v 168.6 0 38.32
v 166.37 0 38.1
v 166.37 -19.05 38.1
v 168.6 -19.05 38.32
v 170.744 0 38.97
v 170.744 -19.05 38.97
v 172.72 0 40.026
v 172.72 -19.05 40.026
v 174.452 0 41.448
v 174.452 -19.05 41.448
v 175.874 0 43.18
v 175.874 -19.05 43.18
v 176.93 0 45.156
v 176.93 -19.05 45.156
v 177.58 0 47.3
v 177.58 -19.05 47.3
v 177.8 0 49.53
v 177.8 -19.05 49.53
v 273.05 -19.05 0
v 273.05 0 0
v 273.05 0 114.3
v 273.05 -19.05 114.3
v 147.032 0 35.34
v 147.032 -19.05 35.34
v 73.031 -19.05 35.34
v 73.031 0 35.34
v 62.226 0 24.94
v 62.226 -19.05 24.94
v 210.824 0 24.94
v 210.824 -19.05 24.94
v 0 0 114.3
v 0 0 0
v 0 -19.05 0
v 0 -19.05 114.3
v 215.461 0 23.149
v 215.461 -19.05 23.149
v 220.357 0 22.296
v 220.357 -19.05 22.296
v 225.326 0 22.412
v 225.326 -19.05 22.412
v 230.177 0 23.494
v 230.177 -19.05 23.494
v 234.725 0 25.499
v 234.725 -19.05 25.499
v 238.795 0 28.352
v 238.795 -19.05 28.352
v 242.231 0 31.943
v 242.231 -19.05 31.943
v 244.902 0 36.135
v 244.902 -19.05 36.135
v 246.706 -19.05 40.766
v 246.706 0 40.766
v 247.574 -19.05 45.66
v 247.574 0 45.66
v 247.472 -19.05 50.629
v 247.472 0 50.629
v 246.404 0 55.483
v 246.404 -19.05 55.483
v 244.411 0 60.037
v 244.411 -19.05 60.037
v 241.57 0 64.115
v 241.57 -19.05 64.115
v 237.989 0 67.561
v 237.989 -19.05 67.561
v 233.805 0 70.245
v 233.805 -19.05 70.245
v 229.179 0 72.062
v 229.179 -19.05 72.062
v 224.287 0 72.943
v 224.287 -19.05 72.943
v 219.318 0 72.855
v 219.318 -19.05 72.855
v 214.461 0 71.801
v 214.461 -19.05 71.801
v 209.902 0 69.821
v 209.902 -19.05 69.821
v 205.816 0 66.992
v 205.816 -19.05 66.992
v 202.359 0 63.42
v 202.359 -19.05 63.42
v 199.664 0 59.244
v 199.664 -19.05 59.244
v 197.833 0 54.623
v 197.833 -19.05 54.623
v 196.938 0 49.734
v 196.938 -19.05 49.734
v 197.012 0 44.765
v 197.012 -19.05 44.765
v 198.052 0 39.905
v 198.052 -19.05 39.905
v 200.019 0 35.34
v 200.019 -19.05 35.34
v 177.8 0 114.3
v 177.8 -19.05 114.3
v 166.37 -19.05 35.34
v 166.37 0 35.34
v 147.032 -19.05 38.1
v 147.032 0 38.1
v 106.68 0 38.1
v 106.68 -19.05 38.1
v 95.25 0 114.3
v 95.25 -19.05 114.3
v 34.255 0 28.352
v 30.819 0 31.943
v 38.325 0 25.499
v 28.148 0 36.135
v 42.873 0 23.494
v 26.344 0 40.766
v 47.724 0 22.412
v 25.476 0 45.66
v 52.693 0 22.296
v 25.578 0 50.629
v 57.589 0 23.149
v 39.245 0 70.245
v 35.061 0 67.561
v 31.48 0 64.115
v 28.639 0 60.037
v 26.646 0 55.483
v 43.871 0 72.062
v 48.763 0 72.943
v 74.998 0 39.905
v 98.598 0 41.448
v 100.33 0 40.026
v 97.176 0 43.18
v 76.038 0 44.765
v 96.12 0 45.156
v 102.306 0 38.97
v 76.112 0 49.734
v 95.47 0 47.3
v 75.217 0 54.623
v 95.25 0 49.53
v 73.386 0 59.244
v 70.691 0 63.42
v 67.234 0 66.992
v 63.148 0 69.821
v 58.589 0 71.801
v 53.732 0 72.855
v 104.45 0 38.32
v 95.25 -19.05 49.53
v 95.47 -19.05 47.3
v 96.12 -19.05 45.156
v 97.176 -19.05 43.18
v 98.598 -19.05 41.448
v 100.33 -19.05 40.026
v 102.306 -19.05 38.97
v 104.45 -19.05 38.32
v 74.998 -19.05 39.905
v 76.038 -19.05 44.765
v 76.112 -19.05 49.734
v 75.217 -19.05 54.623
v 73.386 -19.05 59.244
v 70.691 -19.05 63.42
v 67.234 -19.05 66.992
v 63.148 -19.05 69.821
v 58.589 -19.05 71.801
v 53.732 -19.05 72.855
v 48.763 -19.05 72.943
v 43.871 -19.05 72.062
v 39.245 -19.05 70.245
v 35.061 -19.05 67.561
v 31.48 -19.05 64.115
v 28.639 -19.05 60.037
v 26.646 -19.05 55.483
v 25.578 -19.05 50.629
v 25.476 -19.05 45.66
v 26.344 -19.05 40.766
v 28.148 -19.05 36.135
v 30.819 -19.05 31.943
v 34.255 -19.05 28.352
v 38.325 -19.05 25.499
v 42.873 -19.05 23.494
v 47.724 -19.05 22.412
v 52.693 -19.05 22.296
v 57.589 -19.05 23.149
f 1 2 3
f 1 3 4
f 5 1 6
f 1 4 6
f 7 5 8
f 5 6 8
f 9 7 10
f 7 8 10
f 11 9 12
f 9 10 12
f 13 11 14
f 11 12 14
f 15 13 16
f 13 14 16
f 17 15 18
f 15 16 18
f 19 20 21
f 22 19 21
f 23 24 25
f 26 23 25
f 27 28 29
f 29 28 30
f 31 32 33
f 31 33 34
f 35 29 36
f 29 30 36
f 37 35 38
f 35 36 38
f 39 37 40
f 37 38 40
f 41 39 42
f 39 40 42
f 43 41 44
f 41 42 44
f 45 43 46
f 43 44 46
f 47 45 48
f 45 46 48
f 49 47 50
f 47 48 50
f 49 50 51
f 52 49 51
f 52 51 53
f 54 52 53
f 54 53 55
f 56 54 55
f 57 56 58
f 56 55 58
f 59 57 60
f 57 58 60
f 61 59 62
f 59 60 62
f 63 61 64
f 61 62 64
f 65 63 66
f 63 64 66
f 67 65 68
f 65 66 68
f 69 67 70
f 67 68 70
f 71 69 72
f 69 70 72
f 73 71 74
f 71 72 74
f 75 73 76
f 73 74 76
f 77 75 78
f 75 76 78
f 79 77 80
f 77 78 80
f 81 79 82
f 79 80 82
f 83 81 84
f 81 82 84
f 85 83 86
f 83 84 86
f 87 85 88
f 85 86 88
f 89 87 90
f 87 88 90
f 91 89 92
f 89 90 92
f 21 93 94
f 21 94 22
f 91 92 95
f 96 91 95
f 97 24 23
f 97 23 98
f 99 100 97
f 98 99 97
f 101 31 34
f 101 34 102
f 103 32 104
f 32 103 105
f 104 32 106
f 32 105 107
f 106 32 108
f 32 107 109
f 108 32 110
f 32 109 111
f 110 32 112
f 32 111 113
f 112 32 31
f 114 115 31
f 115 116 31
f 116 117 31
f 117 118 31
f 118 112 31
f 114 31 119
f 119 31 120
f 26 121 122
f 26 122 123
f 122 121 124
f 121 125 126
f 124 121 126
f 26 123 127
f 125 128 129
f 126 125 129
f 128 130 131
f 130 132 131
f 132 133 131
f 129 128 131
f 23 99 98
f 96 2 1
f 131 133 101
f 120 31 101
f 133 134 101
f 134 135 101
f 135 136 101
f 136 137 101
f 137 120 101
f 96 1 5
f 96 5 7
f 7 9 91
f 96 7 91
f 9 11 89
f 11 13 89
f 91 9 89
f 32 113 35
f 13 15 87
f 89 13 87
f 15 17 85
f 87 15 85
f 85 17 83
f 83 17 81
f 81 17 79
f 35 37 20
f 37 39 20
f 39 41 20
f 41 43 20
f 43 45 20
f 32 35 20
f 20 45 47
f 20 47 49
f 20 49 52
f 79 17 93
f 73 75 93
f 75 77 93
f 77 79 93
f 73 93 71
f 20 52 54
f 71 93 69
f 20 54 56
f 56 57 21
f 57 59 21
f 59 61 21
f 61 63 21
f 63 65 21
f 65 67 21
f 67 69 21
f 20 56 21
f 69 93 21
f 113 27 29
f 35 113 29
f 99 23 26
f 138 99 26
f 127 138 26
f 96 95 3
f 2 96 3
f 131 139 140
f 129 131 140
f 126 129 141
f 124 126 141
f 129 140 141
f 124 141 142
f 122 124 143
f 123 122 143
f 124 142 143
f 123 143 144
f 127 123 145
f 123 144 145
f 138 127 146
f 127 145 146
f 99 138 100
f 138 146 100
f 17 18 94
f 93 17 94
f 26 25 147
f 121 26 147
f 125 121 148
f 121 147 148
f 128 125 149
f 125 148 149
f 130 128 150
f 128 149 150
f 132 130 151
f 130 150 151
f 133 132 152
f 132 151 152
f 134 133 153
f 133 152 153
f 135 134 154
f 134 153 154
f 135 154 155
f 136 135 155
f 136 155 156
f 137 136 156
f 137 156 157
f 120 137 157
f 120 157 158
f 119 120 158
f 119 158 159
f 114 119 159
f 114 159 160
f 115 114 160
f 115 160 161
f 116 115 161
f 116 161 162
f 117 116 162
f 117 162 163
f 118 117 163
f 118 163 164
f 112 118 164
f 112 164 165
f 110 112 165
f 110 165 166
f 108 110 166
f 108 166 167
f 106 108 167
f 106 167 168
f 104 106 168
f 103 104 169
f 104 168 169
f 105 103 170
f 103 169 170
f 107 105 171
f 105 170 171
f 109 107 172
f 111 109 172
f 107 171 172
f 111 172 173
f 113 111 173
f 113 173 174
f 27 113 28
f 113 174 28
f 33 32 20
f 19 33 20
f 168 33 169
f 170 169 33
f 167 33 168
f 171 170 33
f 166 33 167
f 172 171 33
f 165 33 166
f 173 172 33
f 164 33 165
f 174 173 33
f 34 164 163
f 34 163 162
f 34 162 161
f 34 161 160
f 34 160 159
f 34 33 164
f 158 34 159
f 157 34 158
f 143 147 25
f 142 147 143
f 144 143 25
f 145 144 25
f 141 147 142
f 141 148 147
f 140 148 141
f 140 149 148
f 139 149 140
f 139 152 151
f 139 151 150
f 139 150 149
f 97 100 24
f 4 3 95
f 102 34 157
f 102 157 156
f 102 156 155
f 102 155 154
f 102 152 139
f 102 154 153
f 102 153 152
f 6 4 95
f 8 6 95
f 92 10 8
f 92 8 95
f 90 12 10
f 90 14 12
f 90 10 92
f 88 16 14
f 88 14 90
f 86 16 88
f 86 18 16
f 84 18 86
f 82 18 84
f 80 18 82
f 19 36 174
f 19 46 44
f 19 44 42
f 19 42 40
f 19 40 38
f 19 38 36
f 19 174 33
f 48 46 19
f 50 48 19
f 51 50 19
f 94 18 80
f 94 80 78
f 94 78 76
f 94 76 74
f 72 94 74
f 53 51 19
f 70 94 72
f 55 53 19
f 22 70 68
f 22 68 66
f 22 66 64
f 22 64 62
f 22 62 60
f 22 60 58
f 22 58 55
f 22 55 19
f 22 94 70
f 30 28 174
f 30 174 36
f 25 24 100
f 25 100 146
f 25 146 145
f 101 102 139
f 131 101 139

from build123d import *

# Parameters (mm, degrees)
F0_W     = 273.05
F0_H     = 114.3
F1_DEPTH = 19.05
F2_R     = 25.4
F3_DEPTH = 25.4
F5_DEPTH = 25.4
F7_DEPTH = 25.4
F8_W     = 19.3382904482
F8_H     = 2.7599734166
F9_DEPTH = 25.4


# Not quite as in the source:
# - a feature names something its author has since deleted; it is built from what else it names


with BuildPart() as f1:
    # F0 (on Front) → F1 (new body)
    with BuildSketch(Plane.XZ):
        with Locations((136.525, 57.15)):
            Rectangle(F0_W, F0_H)
    extrude(amount=F1_DEPTH)

    # F2 (on face) → F3 (cut)
    with BuildSketch(Plane.XZ.offset(19.05)):
        with Locations((50.8, 47.625)):
            Circle(F2_R)
        with Locations((222.25, 47.625)):
            Circle(F2_R)
    extrude(amount=-F3_DEPTH, mode=Mode.SUBTRACT)

    # F4 (on face) → F5 (cut)
    with BuildSketch(Plane.XZ.offset(19.05)):
        with BuildLine():
            Line((200.0185036906, 35.3400265834), (73.0314963094, 35.3400265834))
            ThreePointArc((73.0314963094, 35.3400265834), (68.4136636998, 29.3242117364), (62.225616864, 24.9398665581))
            Line((62.225616864, 24.9398665581), (210.824383136, 24.9398665581))
            ThreePointArc((210.824383136, 24.9398665581), (204.6363363002, 29.3242117364), (200.0185036906, 35.3400265834))
        make_face()
    extrude(amount=-F5_DEPTH, mode=Mode.SUBTRACT)

    # F6 (on face) → F7 (cut)
    with BuildSketch(Plane.XZ.offset(19.05)):
        with BuildLine():
            Line((177.8, 114.3), (95.25, 114.3))
            Line((95.25, 114.3), (95.25, 49.53))
            ThreePointArc((95.25, 49.53), (98.597769491, 41.447769491), (106.68, 38.1))
            Line((106.68, 38.1), (166.37, 38.1))
            ThreePointArc((166.37, 38.1), (174.452230509, 41.447769491), (177.8, 49.53))
            Line((177.8, 49.53), (177.8, 114.3))
        make_face()
    extrude(amount=-F7_DEPTH, mode=Mode.SUBTRACT)

    # F8 (on face) → F9 (cut)
    with BuildSketch(Plane.XZ.offset(19.05)):
        with Locations((156.7008547759, 36.7200132917)):
            Rectangle(F8_W, F8_H)
    extrude(amount=-F9_DEPTH, mode=Mode.SUBTRACT)


solid = f1.part
